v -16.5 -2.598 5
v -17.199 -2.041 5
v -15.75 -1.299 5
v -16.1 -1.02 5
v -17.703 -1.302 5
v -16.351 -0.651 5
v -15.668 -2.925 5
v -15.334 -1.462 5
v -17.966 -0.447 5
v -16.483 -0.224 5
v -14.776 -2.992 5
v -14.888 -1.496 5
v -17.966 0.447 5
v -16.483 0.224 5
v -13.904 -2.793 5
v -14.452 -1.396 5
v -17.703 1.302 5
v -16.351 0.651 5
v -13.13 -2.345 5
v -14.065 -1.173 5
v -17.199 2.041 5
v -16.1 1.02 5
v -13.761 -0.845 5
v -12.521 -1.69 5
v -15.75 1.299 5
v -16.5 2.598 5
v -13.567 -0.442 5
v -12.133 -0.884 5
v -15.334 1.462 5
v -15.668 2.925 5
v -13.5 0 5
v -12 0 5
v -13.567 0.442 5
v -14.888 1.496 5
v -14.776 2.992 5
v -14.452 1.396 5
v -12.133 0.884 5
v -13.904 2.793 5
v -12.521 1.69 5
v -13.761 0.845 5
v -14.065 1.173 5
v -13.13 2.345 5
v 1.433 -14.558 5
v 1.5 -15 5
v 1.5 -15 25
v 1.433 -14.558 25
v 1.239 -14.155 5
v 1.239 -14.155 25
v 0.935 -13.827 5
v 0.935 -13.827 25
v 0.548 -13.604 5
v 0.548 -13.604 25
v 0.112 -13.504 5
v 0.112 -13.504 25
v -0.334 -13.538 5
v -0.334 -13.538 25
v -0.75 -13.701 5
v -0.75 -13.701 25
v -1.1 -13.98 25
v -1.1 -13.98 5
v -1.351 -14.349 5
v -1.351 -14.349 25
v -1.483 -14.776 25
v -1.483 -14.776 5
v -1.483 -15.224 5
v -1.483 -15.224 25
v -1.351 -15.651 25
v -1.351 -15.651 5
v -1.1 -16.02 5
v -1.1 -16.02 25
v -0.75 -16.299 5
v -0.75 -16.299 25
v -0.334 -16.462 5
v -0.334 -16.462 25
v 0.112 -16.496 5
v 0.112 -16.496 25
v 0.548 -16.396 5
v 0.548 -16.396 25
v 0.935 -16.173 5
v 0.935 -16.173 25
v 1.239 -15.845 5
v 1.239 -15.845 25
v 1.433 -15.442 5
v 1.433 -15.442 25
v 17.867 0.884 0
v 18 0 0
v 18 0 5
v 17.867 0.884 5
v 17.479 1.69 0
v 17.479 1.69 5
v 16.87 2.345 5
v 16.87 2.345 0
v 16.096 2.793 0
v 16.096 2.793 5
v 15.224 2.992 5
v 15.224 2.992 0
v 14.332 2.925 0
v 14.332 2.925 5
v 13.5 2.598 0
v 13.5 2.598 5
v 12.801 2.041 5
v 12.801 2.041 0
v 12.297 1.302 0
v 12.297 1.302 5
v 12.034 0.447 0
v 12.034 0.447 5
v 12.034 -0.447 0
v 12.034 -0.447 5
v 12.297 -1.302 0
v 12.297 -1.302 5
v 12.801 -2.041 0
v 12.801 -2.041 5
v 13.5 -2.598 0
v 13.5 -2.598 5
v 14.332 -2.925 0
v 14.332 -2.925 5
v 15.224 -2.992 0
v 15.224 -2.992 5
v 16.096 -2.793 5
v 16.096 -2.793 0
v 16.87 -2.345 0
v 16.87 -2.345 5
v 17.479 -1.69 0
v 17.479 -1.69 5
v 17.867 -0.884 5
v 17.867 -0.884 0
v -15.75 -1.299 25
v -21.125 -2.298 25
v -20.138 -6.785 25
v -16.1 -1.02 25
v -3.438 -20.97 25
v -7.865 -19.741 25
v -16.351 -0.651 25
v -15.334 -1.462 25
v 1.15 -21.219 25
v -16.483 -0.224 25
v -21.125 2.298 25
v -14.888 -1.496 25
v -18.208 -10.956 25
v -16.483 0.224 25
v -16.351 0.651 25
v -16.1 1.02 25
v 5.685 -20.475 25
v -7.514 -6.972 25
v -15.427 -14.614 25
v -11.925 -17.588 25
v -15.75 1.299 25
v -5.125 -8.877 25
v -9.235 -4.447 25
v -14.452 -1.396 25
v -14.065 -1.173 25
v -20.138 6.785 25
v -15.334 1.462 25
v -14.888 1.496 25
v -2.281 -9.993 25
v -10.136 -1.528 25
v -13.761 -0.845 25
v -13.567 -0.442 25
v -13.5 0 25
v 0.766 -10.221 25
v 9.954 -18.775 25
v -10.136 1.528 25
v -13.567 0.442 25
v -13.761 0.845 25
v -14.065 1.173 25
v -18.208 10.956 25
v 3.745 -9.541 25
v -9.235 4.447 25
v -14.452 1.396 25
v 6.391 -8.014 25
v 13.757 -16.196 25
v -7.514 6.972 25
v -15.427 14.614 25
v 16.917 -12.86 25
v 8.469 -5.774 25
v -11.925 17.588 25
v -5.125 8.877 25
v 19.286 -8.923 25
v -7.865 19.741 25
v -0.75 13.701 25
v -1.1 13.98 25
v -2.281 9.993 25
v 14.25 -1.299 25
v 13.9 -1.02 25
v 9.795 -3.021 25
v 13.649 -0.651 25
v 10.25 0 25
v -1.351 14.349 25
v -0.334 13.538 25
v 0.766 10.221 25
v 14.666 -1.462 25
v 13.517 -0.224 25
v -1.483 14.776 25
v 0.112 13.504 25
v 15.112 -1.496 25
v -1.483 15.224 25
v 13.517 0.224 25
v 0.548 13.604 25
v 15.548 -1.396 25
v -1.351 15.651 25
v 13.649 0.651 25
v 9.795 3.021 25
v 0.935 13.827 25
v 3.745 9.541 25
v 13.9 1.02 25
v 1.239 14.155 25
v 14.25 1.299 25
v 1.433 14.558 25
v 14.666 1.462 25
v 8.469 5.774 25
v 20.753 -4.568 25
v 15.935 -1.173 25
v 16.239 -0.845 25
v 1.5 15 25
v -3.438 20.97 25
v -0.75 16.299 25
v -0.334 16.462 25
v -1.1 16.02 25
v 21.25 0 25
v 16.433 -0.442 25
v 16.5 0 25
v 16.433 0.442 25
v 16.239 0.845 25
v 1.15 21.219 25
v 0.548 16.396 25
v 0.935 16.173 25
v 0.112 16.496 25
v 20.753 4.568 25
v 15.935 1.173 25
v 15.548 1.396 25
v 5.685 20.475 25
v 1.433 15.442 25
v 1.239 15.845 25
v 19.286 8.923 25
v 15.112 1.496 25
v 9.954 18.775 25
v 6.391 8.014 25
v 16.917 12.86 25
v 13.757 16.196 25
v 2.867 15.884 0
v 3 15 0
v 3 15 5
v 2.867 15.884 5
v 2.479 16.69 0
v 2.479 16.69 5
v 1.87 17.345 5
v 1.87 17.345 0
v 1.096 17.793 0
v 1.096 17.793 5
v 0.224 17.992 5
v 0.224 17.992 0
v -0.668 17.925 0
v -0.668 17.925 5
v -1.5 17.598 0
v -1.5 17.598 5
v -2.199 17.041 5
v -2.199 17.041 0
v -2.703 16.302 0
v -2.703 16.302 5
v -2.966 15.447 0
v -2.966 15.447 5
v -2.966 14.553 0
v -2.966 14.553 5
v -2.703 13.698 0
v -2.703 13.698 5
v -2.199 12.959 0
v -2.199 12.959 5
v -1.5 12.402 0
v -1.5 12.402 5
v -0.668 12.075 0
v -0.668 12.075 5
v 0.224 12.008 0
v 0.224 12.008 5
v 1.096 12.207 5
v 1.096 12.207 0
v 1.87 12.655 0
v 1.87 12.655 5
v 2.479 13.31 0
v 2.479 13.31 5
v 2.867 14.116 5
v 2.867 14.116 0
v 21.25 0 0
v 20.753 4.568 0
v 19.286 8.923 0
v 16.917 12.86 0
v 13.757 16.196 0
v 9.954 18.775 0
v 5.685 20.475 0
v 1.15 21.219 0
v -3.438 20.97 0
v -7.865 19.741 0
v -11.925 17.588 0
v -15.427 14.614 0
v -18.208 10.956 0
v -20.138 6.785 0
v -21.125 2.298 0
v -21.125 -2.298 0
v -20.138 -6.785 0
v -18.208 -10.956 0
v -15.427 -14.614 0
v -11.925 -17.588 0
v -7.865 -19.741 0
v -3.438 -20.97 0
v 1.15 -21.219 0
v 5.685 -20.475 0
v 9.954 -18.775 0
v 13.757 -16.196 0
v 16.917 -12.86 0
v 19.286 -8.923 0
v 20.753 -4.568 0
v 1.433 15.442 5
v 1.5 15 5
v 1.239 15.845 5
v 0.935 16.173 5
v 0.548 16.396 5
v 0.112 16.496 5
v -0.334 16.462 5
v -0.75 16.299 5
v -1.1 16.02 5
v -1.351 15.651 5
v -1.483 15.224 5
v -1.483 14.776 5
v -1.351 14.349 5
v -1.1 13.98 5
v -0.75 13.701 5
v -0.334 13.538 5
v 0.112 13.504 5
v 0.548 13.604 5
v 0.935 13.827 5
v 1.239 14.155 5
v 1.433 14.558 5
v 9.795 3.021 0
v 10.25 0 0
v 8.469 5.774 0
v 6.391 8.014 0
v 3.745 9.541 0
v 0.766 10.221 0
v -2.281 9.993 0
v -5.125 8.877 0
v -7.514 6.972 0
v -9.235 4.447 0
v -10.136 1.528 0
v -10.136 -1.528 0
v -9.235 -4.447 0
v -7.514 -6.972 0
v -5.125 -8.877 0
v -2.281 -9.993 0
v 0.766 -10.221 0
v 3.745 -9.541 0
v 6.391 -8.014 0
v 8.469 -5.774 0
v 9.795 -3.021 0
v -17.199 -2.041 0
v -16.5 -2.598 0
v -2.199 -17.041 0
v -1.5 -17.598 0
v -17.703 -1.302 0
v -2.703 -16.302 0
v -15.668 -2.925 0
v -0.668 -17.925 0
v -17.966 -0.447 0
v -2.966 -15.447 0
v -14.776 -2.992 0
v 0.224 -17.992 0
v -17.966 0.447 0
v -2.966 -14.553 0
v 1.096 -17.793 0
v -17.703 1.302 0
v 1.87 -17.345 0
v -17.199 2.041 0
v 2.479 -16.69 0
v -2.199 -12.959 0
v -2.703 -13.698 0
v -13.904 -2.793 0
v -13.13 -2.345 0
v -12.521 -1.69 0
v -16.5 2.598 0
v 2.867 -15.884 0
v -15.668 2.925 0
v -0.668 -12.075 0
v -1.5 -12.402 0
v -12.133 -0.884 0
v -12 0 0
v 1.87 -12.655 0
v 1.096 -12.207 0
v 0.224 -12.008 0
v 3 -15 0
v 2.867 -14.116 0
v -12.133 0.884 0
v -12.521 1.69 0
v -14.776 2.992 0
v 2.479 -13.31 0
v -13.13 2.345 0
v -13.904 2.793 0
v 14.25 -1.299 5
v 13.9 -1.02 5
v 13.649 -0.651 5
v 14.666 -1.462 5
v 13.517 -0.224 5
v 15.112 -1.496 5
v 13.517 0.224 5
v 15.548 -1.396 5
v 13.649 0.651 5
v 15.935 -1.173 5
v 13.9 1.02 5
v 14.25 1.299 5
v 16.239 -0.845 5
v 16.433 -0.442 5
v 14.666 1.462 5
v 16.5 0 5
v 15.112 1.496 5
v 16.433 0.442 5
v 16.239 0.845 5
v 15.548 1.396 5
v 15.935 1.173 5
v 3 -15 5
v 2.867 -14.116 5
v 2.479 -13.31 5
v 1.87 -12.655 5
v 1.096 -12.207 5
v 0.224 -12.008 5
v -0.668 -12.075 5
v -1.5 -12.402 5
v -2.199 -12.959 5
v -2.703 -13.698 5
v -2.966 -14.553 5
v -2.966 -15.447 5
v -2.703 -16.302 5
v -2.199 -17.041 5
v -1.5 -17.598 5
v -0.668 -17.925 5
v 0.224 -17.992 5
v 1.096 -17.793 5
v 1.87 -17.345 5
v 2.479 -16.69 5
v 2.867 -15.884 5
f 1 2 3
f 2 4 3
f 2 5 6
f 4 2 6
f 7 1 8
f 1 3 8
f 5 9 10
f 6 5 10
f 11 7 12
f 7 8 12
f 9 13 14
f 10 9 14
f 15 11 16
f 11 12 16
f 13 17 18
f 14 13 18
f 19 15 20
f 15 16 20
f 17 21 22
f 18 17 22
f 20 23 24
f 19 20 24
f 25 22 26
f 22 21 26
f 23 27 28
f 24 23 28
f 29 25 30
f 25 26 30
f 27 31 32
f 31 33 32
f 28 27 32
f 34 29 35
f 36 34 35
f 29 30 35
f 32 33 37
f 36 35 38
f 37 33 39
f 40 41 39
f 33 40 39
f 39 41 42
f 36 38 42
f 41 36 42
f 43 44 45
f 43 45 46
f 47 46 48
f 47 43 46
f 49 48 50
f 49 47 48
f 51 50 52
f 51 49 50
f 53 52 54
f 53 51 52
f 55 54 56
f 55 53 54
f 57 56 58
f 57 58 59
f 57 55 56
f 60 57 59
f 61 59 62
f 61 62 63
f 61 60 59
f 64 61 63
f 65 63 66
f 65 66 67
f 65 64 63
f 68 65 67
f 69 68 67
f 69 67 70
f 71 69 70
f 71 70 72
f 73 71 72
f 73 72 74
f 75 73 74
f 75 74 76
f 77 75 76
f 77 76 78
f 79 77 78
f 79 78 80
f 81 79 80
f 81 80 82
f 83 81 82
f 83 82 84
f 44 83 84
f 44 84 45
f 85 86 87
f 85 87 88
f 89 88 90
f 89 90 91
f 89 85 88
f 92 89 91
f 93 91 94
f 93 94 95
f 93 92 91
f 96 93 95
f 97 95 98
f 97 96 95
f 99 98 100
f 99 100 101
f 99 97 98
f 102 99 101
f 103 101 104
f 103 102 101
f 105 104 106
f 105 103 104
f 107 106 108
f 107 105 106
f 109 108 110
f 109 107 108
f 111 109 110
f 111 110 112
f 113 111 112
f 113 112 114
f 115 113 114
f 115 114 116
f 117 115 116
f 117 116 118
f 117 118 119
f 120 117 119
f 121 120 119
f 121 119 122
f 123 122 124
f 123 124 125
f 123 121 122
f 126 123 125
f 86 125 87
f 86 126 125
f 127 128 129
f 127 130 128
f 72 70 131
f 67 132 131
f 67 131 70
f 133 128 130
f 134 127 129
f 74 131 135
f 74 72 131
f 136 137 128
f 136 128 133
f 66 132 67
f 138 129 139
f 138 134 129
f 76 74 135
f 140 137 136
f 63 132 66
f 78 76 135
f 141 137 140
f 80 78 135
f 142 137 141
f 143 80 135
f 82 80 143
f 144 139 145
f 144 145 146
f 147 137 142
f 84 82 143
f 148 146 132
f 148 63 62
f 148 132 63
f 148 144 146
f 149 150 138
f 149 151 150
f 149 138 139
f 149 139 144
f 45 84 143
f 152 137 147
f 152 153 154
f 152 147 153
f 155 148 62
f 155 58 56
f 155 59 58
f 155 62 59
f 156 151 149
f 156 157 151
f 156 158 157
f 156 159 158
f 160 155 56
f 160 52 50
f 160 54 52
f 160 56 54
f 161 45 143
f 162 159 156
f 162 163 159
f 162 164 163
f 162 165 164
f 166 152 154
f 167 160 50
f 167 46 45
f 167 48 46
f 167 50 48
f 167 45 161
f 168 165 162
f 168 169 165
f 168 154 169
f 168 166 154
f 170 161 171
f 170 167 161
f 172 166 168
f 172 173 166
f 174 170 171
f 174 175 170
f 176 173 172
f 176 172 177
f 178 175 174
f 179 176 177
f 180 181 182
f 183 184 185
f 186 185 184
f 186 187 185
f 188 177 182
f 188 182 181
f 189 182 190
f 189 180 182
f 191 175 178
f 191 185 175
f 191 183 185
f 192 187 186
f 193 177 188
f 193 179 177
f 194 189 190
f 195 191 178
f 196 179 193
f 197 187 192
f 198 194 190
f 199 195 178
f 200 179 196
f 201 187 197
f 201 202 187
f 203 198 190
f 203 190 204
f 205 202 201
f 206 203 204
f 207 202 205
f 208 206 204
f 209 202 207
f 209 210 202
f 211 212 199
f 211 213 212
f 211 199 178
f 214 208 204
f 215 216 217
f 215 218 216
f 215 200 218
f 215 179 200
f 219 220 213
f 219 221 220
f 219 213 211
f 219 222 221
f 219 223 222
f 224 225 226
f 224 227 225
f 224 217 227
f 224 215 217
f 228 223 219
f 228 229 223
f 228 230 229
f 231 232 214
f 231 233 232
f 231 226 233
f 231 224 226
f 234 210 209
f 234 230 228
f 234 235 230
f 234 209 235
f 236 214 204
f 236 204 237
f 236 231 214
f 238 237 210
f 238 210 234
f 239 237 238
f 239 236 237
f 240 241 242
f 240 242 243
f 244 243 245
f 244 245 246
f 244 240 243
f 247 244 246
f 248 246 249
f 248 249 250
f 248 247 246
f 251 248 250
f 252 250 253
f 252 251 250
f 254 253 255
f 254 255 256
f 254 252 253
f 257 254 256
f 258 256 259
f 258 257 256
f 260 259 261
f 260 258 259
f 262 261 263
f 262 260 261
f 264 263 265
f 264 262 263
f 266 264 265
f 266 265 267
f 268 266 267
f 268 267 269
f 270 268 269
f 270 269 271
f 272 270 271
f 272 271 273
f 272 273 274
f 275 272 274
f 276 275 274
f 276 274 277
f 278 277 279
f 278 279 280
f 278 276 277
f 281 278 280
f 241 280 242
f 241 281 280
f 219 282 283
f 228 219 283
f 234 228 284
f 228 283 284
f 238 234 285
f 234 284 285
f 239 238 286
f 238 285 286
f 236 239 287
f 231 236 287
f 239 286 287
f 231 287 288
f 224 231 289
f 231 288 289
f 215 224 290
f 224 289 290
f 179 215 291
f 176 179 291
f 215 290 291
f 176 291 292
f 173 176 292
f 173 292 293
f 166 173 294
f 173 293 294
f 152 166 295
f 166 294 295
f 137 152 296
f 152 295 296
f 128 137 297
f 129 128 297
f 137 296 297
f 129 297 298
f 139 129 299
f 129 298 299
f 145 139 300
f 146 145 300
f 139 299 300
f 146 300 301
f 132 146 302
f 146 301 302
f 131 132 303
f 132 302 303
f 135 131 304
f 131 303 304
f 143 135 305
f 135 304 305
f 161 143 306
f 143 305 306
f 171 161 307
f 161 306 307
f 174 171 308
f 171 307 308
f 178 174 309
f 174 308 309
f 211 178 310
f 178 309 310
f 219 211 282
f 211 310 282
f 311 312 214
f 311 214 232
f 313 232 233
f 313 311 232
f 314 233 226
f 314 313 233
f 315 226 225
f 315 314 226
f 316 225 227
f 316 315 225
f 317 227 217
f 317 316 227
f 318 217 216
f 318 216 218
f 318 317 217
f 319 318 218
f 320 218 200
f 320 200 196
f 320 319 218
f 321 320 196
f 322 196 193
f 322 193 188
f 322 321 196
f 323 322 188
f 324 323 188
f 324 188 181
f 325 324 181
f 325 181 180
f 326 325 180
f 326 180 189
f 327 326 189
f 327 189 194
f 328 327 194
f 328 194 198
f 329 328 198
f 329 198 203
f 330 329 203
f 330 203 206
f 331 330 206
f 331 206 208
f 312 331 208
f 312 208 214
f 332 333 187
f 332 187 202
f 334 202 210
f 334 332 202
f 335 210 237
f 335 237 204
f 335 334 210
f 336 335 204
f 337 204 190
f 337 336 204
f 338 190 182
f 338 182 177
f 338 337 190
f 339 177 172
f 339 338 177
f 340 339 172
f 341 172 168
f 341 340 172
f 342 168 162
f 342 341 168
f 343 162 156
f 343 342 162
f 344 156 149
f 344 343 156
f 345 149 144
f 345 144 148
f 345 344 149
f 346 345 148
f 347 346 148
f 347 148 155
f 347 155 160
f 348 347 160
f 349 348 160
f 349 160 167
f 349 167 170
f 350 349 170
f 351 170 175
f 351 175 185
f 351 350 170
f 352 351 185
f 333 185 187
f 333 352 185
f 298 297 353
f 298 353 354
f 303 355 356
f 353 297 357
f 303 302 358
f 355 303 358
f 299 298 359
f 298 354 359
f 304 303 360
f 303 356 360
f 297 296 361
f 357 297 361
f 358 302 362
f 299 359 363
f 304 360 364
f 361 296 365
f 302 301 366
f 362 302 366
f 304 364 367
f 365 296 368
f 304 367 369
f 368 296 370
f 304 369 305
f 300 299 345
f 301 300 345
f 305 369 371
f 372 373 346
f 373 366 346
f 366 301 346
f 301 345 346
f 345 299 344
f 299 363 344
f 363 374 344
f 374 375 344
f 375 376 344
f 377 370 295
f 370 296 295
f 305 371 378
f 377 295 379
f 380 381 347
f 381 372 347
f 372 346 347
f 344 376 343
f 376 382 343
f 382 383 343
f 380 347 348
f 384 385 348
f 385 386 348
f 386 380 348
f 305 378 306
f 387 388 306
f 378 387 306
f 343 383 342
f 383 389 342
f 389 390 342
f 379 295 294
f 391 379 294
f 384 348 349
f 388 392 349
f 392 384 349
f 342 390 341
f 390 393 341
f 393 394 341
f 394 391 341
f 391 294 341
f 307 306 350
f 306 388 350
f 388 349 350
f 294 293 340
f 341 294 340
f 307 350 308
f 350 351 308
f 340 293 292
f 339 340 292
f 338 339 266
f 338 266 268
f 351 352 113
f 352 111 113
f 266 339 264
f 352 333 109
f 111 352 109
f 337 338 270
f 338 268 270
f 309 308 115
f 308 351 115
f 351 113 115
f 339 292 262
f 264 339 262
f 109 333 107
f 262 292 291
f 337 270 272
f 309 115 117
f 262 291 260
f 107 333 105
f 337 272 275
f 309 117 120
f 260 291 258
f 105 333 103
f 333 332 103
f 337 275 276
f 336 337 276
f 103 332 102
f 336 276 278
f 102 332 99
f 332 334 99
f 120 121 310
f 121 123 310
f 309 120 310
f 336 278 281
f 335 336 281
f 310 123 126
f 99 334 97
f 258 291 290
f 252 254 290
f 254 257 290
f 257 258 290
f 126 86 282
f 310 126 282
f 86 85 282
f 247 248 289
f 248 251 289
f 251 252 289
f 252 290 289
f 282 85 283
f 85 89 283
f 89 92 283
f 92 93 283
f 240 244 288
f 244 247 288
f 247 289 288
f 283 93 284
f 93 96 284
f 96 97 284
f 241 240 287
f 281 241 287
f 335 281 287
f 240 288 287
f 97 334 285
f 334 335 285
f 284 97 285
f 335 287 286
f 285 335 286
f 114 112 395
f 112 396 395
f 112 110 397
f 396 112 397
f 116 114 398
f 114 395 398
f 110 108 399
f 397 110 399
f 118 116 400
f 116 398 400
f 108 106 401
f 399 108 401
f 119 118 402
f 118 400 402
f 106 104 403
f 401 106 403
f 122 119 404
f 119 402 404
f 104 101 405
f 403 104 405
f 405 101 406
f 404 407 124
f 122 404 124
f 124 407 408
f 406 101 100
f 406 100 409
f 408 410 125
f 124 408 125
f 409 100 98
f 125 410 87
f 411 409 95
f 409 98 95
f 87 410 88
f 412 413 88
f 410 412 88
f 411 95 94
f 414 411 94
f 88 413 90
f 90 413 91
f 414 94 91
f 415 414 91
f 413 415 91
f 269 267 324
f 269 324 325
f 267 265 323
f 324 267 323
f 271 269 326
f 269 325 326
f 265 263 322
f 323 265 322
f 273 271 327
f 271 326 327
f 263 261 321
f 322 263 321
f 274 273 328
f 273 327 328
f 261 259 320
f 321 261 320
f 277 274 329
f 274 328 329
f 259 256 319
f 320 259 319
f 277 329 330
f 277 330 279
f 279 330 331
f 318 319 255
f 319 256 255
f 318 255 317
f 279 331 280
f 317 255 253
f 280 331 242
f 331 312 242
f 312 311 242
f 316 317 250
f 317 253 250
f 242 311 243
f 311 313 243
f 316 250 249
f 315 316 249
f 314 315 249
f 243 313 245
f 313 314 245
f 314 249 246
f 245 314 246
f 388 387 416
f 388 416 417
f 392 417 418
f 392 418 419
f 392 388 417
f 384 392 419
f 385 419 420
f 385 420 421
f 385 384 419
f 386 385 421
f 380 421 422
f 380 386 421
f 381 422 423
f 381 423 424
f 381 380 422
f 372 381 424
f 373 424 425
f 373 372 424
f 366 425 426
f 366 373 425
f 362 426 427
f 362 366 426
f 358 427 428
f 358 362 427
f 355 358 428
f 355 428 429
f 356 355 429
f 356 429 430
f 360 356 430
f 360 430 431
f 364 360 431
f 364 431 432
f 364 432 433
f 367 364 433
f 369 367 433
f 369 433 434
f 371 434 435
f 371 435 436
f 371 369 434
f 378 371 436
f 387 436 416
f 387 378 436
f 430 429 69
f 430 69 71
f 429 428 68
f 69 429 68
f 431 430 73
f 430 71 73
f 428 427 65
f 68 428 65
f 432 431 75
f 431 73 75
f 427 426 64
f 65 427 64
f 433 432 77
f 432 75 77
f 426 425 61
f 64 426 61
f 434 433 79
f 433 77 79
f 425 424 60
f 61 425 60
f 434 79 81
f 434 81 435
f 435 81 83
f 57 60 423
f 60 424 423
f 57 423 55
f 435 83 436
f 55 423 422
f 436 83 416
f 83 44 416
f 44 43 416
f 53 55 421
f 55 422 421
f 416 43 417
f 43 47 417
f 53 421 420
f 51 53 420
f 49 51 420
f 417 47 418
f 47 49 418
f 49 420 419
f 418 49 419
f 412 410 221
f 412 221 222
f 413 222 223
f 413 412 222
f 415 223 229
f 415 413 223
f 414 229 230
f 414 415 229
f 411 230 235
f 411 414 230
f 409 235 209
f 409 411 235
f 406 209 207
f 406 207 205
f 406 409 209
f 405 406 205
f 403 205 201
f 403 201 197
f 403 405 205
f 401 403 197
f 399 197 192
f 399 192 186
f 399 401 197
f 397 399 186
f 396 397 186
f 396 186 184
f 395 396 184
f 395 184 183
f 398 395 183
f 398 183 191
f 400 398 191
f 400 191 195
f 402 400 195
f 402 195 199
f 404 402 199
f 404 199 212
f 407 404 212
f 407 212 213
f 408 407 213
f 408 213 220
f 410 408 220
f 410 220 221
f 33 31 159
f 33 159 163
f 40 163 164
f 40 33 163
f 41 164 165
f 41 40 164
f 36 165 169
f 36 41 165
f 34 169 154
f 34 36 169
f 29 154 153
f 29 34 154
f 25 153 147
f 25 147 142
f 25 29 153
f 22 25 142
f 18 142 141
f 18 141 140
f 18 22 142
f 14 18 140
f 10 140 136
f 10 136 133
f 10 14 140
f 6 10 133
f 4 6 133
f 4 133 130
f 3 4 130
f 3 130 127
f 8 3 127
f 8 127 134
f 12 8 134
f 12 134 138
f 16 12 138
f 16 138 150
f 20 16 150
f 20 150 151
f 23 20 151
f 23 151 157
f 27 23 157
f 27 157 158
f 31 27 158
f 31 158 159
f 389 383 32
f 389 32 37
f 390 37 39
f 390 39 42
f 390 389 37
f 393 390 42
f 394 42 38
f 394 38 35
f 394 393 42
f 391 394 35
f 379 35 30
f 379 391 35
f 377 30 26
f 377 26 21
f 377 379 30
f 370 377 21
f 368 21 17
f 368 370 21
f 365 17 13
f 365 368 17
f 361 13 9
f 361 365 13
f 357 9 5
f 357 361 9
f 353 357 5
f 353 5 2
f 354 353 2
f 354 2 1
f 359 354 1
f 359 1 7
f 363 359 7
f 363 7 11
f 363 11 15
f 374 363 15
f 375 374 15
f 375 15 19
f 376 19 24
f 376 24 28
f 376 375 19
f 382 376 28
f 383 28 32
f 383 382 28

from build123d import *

# Parameters (mm, degrees)
CYLINDER007_R     = 3
CYLINDER007_DEPTH = 5
CYLINDER008_R     = 3
CYLINDER008_DEPTH = 5
CYLINDER009_R     = 3
CYLINDER009_DEPTH = 5
CYLINDER006_R     = 3
CYLINDER006_DEPTH = 5
CYLINDER005_R     = 1.5
CYLINDER005_DEPTH = 25
CYLINDER004_R     = 1.5
CYLINDER004_DEPTH = 25
CYLINDER003_R     = 1.5
CYLINDER003_DEPTH = 25
CYLINDER002_R     = 1.5
CYLINDER002_DEPTH = 25
CYLINDER001_R     = 10.25
CYLINDER001_DEPTH = 25
CYLINDER_R        = 21.25
CYLINDER_DEPTH    = 25


with BuildPart() as zylinder007:
    # Cylinder007 → Cylinder007 (new body)
    with BuildSketch(Plane(origin=(0, 15, 0), x_dir=(1, 0, 0), z_dir=(0, 0, 1))):
        Circle(CYLINDER007_R)
    extrude(amount=CYLINDER007_DEPTH)


with BuildPart() as zylinder008:
    # Cylinder008 → Cylinder008 (new body)
    with BuildSketch(Plane(origin=(-15, 0, 0), x_dir=(1, 0, 0), z_dir=(0, 0, 1))):
        Circle(CYLINDER008_R)
    extrude(amount=CYLINDER008_DEPTH)


with BuildPart() as zylinder009:
    # Cylinder009 → Cylinder009 (new body)
    with BuildSketch(Plane(origin=(0, -15, 0), x_dir=(1, 0, 0), z_dir=(0, 0, 1))):
        Circle(CYLINDER009_R)
    extrude(amount=CYLINDER009_DEPTH)


with BuildPart() as zylinder006:
    # Cylinder006 → Cylinder006 (new body)
    with BuildSketch(Plane(origin=(15, 0, 0), x_dir=(1, 0, 0), z_dir=(0, 0, 1))):
        Circle(CYLINDER006_R)
    extrude(amount=CYLINDER006_DEPTH)


with BuildPart() as zylinder005:
    # Cylinder005 → Cylinder005 (new body)
    with BuildSketch(Plane(origin=(0, -15, 0), x_dir=(1, 0, 0), z_dir=(0, 0, 1))):
        Circle(CYLINDER005_R)
    extrude(amount=CYLINDER005_DEPTH)


with BuildPart() as zylinder004:
    # Cylinder004 → Cylinder004 (new body)
    with BuildSketch(Plane(origin=(-15, 0, 0), x_dir=(1, 0, 0), z_dir=(0, 0, 1))):
        Circle(CYLINDER004_R)
    extrude(amount=CYLINDER004_DEPTH)


with BuildPart() as zylinder003:
    # Cylinder003 → Cylinder003 (new body)
    with BuildSketch(Plane(origin=(0, 15, 0), x_dir=(1, 0, 0), z_dir=(0, 0, 1))):
        Circle(CYLINDER003_R)
    extrude(amount=CYLINDER003_DEPTH)


with BuildPart() as zylinder002:
    # Cylinder002 → Cylinder002 (new body)
    with BuildSketch(Plane(origin=(15, 0, 0), x_dir=(1, 0, 0), z_dir=(0, 0, 1))):
        Circle(CYLINDER002_R)
    extrude(amount=CYLINDER002_DEPTH)


with BuildPart() as zylinder001:
    # Cylinder001 → Cylinder001 (new body)
    with BuildSketch(Plane.XY):
        Circle(CYLINDER001_R)
    extrude(amount=CYLINDER001_DEPTH)


with BuildPart() as cut008:
    # Cylinder → Cylinder (new body)
    with BuildSketch(Plane.XY):
        Circle(CYLINDER_R)
    extrude(amount=CYLINDER_DEPTH)

    # Cut: cut Zylinder001
    add(zylinder001.part, mode=Mode.SUBTRACT)

    # Cut001: cut Zylinder002
    add(zylinder002.part, mode=Mode.SUBTRACT)

    # Cut002: cut Zylinder003
    add(zylinder003.part, mode=Mode.SUBTRACT)

    # Cut003: cut Zylinder004
    add(zylinder004.part, mode=Mode.SUBTRACT)

    # Cut004: cut Zylinder005
    add(zylinder005.part, mode=Mode.SUBTRACT)

    # Cut005: cut Zylinder006
    add(zylinder006.part, mode=Mode.SUBTRACT)

    # Cut006: cut Zylinder009
    add(zylinder009.part, mode=Mode.SUBTRACT)

    # Cut007: cut Zylinder008
    add(zylinder008.part, mode=Mode.SUBTRACT)

    # Cut008: cut Zylinder007
    add(zylinder007.part, mode=Mode.SUBTRACT)


solid = cut008.part
